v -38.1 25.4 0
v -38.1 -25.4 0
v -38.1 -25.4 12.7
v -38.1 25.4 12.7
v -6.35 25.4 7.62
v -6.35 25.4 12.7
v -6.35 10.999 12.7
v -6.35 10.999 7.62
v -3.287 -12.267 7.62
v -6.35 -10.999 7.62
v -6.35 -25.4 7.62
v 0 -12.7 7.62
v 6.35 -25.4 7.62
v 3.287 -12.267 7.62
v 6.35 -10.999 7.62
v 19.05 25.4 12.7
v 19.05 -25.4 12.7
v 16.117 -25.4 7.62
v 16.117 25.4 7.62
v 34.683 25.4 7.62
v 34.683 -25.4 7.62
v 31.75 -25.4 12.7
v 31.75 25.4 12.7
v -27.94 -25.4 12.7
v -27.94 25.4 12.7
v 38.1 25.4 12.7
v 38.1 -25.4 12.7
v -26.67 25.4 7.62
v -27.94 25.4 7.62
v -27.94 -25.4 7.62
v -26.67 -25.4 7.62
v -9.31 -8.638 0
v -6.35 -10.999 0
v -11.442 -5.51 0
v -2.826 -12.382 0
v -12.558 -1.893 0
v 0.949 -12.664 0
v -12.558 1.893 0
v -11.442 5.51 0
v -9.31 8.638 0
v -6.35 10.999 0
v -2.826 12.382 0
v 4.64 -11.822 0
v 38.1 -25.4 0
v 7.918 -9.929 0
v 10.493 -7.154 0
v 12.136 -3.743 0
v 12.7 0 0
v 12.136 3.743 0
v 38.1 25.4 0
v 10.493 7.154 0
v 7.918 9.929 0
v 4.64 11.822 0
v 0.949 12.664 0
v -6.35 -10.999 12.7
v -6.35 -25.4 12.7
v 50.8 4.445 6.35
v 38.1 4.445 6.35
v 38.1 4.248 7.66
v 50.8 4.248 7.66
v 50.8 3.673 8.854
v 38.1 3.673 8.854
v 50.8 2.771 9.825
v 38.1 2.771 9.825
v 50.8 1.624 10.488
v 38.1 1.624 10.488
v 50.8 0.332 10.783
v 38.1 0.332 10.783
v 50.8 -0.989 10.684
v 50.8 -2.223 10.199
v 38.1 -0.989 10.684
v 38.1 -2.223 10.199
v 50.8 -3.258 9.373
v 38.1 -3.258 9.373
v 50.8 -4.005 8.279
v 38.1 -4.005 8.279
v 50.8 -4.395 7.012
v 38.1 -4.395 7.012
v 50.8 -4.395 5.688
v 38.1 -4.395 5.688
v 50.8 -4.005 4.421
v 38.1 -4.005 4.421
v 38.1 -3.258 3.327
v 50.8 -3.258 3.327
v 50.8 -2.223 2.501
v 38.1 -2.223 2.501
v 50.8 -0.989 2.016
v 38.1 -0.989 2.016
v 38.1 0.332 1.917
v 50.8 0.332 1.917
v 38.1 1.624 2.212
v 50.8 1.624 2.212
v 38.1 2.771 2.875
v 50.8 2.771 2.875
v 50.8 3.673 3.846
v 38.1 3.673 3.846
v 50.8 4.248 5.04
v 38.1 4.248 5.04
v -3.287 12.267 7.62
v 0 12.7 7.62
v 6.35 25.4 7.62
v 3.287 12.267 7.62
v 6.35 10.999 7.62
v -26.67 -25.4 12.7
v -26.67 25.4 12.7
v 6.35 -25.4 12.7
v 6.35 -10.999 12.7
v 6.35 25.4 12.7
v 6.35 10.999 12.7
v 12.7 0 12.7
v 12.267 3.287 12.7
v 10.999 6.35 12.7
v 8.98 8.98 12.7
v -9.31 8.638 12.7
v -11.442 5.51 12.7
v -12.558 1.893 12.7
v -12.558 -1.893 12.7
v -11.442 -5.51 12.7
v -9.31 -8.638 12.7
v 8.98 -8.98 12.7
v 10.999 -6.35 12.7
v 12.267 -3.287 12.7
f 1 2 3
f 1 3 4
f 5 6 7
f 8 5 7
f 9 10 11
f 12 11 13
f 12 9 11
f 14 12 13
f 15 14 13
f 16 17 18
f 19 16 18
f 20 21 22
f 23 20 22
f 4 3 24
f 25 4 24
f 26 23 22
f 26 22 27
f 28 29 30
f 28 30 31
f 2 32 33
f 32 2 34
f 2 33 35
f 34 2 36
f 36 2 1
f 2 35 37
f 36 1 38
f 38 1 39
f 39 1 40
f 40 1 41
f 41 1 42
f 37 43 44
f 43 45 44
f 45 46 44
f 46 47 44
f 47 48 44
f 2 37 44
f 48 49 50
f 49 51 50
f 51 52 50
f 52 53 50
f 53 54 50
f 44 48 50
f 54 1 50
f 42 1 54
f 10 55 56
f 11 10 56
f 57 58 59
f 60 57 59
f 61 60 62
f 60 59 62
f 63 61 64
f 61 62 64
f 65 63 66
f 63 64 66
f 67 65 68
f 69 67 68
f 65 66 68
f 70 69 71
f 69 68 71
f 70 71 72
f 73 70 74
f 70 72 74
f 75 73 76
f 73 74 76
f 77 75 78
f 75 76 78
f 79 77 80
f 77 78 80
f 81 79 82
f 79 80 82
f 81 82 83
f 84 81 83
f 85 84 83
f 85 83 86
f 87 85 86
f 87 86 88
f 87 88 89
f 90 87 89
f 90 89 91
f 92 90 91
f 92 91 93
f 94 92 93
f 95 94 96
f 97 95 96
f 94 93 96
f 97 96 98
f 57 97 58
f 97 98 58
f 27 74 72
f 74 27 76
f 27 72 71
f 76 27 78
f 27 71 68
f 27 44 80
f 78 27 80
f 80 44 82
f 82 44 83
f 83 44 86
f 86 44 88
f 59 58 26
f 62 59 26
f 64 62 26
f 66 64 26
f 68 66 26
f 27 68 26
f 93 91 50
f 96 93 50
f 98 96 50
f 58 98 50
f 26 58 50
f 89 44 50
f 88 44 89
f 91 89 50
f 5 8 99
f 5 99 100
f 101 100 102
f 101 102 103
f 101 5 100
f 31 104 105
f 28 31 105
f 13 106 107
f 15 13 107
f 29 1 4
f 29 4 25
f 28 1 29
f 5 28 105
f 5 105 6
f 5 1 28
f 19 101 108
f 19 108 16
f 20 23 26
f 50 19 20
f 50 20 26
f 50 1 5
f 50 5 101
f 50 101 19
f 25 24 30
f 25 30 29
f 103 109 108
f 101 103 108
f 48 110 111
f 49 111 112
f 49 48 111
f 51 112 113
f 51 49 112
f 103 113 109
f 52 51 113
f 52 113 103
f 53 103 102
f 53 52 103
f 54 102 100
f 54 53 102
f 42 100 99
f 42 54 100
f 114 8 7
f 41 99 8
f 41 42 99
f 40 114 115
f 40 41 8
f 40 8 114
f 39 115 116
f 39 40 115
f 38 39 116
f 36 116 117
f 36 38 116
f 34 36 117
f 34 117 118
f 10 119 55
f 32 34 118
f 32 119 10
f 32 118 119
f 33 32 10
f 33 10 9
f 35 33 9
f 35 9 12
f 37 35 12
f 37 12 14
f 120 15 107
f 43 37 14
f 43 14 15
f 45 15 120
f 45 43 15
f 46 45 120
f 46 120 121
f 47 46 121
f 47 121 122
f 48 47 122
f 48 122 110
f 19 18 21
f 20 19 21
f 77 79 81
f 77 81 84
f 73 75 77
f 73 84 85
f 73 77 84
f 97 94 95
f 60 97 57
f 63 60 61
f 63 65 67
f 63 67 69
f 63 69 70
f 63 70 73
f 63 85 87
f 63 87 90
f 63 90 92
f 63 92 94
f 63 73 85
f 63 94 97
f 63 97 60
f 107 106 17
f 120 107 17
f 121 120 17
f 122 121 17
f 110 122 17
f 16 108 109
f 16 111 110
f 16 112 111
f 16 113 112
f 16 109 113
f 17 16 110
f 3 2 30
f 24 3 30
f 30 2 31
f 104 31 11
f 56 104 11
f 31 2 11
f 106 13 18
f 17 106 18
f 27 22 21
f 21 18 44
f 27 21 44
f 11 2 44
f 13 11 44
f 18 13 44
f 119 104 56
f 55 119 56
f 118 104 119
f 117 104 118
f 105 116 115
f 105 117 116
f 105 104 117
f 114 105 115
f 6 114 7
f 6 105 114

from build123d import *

# Parameters (mm, degrees)
F0_W     = 76.2
F0_H     = 50.8
F0_R     = 12.7
F1_DEPTH = 12.7
F2_W     = 1.27
F2_H     = 50.8
F3_DEPTH = 5.08
F5_DEPTH = 50.801
F6_R     = 4.445
F7_DEPTH = 12.7


with BuildPart() as f1:
    # F0 (on Top) → F1 (new body)
    with BuildSketch(Plane.XY):
        Rectangle(F0_W, F0_H)
        Circle(F0_R, mode=Mode.SUBTRACT)
    extrude(amount=F1_DEPTH)

    # F2 (on face) → F3 (cut)
    with BuildSketch(Plane.XY.offset(12.7)):
        with Locations((-27.305, 0)):
            Rectangle(F2_W, F2_H)
        with BuildLine():
            Line((6.35, 25.4), (-6.35, 25.4))
            Line((-6.35, 25.4), (-6.35, 10.9985226281))
            ThreePointArc((-6.35, 10.9985226281), (0, 12.7), (6.35, 10.9985226281))
            Line((6.35, 10.9985226281), (6.35, 25.4))
        make_face()
        with BuildLine():
            Line((-6.35, -10.9985226281), (-6.35, -25.4))
            Line((-6.35, -25.4), (6.35, -25.4))
            Line((6.35, -25.4), (6.35, -10.9985226281))
            ThreePointArc((6.35, -10.9985226281), (0, -12.7), (-6.35, -10.9985226281))
        make_face()
    extrude(amount=-F3_DEPTH, mode=Mode.SUBTRACT)

    # F4 (on face) → F5 (cut, through all)
    with BuildSketch(Plane.XZ.offset(25.4)):
        Polygon((25.4, 12.7), (19.05, 12.7), (16.1170606325, 7.62), (25.4, 7.62), align=None)
        Polygon((31.75, 12.7), (25.4, 12.7), (25.4, 7.62), (34.6829393675, 7.62), align=None)
    extrude(amount=-F5_DEPTH, mode=Mode.SUBTRACT)

    # F6 (on face) → F7 (join)
    with BuildSketch(Plane.YZ.offset(38.1)):
        with Locations((0, 6.35)):
            Circle(F6_R)
    extrude(amount=F7_DEPTH)


solid = f1.part
